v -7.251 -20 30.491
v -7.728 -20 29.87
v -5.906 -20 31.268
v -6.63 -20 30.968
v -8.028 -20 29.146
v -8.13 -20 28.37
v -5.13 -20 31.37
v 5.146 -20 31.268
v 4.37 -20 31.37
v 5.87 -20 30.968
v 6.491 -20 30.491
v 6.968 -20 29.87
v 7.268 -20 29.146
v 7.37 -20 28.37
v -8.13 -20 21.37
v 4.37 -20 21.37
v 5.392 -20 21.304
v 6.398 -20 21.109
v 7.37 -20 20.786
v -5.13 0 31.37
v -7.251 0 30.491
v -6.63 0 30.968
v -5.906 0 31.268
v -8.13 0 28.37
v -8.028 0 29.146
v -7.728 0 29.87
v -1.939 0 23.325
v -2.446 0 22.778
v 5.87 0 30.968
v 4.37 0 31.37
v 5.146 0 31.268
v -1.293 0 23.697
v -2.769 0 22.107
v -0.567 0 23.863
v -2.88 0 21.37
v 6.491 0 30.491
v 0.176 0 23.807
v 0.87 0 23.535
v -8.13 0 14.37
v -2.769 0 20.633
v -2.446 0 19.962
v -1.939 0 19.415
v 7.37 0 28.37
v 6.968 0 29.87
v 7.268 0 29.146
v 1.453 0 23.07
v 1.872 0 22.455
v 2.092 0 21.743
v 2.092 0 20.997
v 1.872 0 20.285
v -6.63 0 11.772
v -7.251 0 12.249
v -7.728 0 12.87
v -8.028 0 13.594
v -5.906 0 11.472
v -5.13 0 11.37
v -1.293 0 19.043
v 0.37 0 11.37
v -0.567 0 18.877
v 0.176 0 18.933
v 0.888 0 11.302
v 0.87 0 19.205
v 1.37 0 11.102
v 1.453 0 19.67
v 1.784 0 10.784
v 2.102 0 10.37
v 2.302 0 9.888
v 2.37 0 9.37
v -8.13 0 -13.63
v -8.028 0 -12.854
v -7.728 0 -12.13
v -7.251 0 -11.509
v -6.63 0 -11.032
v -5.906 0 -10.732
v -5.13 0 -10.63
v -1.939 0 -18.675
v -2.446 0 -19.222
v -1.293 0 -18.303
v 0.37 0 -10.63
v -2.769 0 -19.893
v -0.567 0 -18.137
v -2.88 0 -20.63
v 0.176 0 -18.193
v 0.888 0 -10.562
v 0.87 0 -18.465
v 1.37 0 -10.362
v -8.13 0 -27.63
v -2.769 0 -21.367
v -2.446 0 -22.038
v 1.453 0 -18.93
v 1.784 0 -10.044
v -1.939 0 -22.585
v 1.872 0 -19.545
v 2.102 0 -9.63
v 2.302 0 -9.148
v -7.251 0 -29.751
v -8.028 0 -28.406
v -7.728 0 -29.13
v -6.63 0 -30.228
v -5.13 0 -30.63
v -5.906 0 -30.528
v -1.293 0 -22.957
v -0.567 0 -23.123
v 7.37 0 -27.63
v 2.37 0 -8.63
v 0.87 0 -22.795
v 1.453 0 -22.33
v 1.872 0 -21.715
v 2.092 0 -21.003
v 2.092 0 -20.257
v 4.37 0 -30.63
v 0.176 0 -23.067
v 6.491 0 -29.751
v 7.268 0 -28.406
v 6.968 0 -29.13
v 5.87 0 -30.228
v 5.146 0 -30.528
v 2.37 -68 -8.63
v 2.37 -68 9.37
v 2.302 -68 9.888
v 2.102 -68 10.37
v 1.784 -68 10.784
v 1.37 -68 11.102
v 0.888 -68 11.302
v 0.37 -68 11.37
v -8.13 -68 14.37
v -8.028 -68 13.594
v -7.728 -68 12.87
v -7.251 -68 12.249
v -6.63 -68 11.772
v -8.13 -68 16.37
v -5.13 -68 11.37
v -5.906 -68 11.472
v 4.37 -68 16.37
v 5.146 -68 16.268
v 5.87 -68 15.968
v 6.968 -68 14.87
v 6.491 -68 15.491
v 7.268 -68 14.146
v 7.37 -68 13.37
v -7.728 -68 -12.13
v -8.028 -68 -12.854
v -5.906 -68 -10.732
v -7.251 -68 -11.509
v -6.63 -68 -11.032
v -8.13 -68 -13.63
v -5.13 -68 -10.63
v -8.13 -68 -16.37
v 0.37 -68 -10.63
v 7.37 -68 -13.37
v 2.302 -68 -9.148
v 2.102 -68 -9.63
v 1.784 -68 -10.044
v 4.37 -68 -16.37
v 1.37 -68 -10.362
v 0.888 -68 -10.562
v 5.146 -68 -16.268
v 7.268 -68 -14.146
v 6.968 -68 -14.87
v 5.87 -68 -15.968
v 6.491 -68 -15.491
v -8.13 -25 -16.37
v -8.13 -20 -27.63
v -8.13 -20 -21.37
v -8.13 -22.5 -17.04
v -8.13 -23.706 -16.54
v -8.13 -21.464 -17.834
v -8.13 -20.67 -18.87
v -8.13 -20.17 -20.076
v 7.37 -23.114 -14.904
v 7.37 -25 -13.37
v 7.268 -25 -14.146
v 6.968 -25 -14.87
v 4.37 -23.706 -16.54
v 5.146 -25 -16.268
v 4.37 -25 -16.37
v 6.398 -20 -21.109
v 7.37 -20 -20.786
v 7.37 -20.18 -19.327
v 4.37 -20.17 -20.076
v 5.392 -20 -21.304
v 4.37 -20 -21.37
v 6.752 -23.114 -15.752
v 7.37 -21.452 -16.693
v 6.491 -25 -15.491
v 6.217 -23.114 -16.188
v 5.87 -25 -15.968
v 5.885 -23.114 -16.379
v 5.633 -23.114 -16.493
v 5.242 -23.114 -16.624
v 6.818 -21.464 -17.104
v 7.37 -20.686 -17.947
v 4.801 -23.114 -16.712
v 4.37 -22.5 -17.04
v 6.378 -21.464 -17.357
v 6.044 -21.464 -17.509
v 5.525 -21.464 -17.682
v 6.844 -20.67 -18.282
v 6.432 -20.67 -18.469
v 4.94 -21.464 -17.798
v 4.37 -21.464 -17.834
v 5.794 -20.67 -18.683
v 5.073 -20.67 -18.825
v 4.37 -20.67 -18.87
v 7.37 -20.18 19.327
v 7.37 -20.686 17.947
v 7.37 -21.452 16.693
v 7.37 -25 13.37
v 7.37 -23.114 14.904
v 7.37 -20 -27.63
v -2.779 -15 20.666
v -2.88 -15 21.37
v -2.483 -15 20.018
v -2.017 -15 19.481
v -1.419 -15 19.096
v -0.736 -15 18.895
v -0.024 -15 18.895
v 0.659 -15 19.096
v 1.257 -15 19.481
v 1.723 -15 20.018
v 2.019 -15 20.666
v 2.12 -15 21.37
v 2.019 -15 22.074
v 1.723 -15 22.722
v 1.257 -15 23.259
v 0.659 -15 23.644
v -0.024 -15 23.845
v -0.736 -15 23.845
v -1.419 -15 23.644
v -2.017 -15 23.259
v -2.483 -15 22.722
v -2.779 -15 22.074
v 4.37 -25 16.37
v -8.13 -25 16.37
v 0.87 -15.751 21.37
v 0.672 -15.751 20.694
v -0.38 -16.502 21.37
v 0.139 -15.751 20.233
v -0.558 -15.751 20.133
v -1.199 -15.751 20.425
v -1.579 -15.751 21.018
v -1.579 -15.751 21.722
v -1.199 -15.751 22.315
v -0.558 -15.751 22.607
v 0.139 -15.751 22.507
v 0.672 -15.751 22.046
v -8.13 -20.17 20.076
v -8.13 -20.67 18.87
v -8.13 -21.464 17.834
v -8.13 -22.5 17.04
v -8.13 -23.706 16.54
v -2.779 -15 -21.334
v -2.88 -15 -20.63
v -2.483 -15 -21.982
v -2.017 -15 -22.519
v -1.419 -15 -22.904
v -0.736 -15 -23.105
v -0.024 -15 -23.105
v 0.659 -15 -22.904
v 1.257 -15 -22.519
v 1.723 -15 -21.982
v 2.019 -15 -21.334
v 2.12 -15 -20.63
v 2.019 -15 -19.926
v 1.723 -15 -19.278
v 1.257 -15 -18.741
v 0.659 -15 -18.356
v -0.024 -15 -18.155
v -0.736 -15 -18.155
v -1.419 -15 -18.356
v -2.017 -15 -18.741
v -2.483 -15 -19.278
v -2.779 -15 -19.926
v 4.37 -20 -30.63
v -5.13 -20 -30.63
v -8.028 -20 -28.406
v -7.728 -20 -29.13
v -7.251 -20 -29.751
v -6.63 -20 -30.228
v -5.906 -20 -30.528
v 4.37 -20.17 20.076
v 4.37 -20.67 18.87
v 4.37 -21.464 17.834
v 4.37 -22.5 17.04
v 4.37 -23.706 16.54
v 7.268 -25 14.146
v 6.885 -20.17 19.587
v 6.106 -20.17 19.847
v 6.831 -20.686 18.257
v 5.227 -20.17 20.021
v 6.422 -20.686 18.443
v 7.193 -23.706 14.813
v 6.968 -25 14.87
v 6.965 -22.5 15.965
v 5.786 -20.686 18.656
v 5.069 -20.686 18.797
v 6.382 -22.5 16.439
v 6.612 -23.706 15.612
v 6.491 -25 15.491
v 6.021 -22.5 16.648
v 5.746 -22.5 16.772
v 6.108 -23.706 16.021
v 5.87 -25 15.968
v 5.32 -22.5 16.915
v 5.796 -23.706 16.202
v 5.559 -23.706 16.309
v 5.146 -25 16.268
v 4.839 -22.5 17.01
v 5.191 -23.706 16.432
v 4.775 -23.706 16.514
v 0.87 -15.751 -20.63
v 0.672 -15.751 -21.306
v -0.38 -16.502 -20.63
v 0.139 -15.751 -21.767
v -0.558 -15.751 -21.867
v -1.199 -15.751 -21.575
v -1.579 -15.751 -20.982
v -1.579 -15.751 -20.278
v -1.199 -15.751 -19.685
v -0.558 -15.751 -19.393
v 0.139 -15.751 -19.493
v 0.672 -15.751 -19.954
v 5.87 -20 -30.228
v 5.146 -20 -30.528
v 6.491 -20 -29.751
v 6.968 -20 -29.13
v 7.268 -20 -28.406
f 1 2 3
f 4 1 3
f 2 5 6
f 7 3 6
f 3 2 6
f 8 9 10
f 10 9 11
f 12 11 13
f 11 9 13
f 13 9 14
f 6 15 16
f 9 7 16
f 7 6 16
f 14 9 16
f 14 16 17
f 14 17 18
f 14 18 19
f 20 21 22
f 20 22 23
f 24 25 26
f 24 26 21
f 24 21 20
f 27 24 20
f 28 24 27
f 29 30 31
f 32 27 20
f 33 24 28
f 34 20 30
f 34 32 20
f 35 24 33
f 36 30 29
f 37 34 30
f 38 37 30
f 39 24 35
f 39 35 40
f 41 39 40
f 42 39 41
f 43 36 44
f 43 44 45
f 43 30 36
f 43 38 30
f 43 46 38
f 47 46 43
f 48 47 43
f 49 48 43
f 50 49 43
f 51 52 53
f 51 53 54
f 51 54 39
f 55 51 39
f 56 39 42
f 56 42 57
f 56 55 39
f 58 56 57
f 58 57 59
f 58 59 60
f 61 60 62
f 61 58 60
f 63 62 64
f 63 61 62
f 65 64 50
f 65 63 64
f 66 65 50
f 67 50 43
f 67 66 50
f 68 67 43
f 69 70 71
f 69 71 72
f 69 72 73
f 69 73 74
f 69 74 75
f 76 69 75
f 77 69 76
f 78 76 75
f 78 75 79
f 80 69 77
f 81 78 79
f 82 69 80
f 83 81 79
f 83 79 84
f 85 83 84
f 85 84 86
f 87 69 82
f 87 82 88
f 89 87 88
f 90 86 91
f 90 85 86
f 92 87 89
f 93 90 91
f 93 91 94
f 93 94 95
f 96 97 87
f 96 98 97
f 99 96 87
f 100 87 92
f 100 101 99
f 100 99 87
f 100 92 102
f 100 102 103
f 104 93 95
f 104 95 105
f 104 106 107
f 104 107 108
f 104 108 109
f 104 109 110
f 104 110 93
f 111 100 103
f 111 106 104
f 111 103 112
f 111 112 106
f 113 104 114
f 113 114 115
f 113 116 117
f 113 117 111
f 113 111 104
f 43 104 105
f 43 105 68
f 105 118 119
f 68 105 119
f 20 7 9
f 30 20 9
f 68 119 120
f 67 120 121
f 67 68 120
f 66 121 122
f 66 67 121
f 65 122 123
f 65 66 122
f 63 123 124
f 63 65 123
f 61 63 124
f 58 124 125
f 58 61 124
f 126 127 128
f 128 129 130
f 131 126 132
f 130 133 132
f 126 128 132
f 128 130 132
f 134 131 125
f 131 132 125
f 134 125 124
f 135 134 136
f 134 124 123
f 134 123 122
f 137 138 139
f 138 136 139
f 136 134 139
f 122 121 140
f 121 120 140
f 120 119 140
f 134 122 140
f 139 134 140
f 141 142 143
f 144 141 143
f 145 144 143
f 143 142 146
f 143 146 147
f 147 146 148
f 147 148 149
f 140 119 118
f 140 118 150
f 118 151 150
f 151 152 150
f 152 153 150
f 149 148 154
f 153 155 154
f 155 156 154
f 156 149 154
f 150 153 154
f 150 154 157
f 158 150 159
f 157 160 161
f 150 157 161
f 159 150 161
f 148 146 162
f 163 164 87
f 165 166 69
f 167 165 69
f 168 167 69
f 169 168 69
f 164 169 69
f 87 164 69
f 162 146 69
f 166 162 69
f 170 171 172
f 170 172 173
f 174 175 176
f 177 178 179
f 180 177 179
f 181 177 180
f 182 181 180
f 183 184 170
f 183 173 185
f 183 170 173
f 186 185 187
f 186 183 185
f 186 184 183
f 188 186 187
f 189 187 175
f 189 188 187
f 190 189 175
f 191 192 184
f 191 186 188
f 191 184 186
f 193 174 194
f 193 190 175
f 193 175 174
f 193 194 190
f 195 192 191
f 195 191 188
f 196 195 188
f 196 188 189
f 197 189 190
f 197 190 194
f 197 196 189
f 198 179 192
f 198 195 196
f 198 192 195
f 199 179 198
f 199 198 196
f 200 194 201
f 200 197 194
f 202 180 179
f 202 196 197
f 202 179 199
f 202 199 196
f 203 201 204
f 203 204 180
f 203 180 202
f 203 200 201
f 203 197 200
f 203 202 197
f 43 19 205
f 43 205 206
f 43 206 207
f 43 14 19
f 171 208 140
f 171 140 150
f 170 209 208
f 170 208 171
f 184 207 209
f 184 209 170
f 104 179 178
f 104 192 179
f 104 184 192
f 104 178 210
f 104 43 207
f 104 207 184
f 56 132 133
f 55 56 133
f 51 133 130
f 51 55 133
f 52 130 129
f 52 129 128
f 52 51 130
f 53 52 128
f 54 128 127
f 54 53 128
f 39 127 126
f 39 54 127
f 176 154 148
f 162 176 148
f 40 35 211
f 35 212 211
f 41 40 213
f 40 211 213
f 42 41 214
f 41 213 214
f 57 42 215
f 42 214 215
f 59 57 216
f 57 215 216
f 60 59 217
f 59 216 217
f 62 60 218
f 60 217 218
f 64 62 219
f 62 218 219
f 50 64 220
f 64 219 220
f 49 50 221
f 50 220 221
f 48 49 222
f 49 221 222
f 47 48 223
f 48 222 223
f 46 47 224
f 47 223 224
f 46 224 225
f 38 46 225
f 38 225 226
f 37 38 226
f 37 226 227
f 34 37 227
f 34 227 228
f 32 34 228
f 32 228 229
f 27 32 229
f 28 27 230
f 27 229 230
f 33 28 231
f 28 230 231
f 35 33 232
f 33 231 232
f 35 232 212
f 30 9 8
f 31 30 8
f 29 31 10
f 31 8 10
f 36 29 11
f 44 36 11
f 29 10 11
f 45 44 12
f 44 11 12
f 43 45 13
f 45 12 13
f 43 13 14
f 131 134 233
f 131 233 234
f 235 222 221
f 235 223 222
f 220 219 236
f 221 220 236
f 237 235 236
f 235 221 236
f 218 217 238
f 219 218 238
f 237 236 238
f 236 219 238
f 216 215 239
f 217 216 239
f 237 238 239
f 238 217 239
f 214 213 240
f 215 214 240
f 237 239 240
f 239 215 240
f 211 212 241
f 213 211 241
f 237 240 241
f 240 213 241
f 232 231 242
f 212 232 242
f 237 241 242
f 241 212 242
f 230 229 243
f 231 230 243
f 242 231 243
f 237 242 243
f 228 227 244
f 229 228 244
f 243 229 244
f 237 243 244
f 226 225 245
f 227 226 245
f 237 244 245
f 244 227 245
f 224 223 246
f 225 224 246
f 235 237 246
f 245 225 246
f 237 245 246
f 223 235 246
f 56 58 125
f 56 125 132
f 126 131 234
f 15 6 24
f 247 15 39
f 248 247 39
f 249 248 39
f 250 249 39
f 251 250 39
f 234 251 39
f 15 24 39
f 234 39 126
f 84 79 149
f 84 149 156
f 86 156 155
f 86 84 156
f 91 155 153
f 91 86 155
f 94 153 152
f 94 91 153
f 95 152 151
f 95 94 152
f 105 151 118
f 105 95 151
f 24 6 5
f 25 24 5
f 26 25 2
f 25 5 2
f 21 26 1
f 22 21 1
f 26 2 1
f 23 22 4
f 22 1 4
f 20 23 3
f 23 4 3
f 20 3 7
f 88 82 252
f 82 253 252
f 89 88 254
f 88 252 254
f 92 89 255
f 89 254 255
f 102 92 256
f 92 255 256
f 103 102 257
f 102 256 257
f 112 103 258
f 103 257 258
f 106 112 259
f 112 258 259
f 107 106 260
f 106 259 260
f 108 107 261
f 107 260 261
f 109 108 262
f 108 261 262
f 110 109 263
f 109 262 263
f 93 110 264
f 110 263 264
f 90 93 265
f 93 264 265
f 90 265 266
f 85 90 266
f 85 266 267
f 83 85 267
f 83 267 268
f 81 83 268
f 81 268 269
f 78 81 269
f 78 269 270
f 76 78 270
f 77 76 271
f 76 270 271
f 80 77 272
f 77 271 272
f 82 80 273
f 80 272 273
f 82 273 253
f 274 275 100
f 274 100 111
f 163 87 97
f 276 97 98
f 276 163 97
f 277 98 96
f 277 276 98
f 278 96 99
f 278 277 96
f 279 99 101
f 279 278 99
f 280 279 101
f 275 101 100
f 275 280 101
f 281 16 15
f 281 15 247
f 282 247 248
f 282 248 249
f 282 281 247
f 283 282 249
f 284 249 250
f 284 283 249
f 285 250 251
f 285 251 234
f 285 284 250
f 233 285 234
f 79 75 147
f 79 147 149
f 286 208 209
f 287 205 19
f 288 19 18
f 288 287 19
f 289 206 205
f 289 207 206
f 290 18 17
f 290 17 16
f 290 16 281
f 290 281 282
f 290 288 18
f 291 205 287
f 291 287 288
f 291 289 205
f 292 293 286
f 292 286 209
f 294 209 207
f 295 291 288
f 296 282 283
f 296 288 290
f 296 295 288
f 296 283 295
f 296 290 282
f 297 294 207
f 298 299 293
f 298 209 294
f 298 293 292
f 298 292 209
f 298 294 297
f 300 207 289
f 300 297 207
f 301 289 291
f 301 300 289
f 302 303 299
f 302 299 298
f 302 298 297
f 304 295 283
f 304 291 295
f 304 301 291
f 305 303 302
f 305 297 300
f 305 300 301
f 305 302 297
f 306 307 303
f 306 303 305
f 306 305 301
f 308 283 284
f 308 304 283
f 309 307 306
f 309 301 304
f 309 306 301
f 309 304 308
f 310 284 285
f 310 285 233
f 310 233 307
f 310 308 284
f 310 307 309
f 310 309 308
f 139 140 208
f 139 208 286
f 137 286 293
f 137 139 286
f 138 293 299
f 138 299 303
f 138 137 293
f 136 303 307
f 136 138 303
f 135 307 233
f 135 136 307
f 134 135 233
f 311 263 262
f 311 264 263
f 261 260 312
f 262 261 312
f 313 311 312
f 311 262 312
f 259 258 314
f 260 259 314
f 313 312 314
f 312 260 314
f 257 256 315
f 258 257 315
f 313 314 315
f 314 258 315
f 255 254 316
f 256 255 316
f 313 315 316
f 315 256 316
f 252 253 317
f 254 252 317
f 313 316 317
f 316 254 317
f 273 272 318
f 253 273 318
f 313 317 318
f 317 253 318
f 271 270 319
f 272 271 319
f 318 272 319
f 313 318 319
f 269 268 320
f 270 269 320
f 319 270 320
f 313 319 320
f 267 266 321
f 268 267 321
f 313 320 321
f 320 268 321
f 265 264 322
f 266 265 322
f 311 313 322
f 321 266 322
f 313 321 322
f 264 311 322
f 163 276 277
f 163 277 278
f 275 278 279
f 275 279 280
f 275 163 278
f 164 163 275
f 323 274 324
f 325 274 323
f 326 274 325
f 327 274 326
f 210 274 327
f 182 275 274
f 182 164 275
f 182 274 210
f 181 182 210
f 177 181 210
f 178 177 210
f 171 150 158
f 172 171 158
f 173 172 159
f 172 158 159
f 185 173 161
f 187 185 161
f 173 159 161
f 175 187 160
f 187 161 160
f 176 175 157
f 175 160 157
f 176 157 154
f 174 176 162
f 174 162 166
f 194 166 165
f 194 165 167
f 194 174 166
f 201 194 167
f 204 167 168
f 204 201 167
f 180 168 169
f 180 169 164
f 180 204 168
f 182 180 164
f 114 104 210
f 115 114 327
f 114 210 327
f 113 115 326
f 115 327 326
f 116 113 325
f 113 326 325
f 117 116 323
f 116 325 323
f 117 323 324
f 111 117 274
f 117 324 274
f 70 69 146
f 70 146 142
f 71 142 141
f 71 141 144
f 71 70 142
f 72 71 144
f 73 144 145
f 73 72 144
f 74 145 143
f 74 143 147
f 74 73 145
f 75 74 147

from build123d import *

# Parameters (mm, degrees)
SKETCH1_W             = 15.5
SKETCH1_H             = 62
BOSS_EXTRUDE1_DEPTH   = 68
FILLET1_R             = 3
CUT_EXTRUDE1_REACH    = 77.327
CUT_EXTRUDE2_DEPTH    = 48
FILLET2_R             = 5
M6_TAPPED_HOLE1_D     = 5
M6_TAPPED_HOLE1_DEPTH = 15
M6_TAPPED_HOLE1_TIP   = 1.502151548


with BuildPart() as part:
    # Sketch1 → Boss-Extrude1 (new body)
    with BuildSketch(Plane(origin=(0, 0, 0), x_dir=(1, 0, 0), z_dir=(0, 1, 0))):
        with Locations((-0.38, -0.37)):
            Rectangle(SKETCH1_W, SKETCH1_H)
    extrude(amount=-BOSS_EXTRUDE1_DEPTH)

    # Fillet1
    fillet1_edges = [part.edges().sort_by_distance(p)[0] for p in [
        (7.37, -34, 31.37),
        (-8.13, -34, 31.37),
        (-8.13, -34, -30.63),
        (7.37, -34, -30.63),
    ]]
    fillet(fillet1_edges, radius=FILLET1_R)

    # Sketch2 → Cut-Extrude1 (cut, up to next)
    with BuildSketch(Plane(origin=(0, 0, 0), x_dir=(1, 0, 0), z_dir=(0, 1, 0)), mode=Mode.PRIVATE) as cut_extrude1_sk1:
        with BuildLine():
            Line((-5.13, 10.63), (0.37, 10.63))
            ThreePointArc((0.37, 10.63), (1.784213562, 10.044213562), (2.37, 8.63))
            Line((2.37, 8.63), (2.37, -9.37))
            ThreePointArc((2.37, -9.37), (1.784213562, -10.784213562), (0.37, -11.37))
            Line((0.37, -11.37), (-5.13, -11.37))
            ThreePointArc((-5.13, -11.37), (-7.251320344, -12.248679656), (-8.13, -14.37))
            Line((-8.13, -14.37), (-8.13, 13.63))
            ThreePointArc((-8.13, 13.63), (-7.251320344, 11.508679656), (-5.13, 10.63))
        make_face()
    cut_extrude1_tool1 = extrude(cut_extrude1_sk1.sketch, amount=-CUT_EXTRUDE1_REACH, mode=Mode.PRIVATE) & part.part
    add(cut_extrude1_tool1.solids().sort_by_distance((-2.991251, 0, 0.37))[0], mode=Mode.SUBTRACT)

    # Sketch3 → Cut-Extrude2 (cut)
    with BuildSketch(Plane(origin=(0, -68, 0), x_dir=(1, 0, 0), z_dir=(0, 1, 0))):
        with BuildLine():
            Line((4.37, -16.37), (-8.13, -16.37))
            Line((-8.13, -16.37), (-8.13, -28.37))
            ThreePointArc((-8.13, -28.37), (-7.251320344, -30.491320344), (-5.13, -31.37))
            Line((-5.13, -31.37), (4.37, -31.37))
            ThreePointArc((4.37, -31.37), (6.491320344, -30.491320344), (7.37, -28.37))
            Line((7.37, -28.37), (7.37, -13.37))
            ThreePointArc((7.37, -13.37), (6.491320344, -15.491320344), (4.37, -16.37))
        make_face()
    cut_extrude2 = extrude(amount=CUT_EXTRUDE2_DEPTH, mode=Mode.SUBTRACT)

    # Mirror1: Cut-Extrude2 across plane
    add(cut_extrude2.mirror(Plane.XY), mode=Mode.SUBTRACT)

    # Fillet2
    # the kernel refuses this fillet: 5 mm, written as the material it adds along each edge
    with BuildSketch(Plane(origin=(4.37, -20, -16.37), x_dir=(0, -1, 0), z_dir=(-1, 0, 0)), Plane(origin=(4.37, -20, 16.37), x_dir=(0, 0, 1), z_dir=(-1, 0, 0))) as fillet2_piece_1:
        with BuildLine():
            CenterArc((FILLET2_R, -FILLET2_R), FILLET2_R, 90, 90)
            Line((0, -FILLET2_R), (0, 0))
            Line((0, 0), (FILLET2_R, 0))
        make_face()
    extrude(amount=12.5)
    with BuildSketch(Plane(origin=(4.37, -20, -13.37), x_dir=(-0.5176042277799098, 0, -0.855620163030514), z_dir=(0.855620163030514, 0, -0.5176042277799098))) as fillet2_piece_2_section:
        with BuildLine():
            CenterArc((-3 - FILLET2_R, -FILLET2_R), FILLET2_R, 0, 90)
            Line((-3, -FILLET2_R), (-3, 0))
            Line((-3, 0), (-3 - FILLET2_R, 0))
        make_face()
    fillet2_piece_2 = revolve(axis=Axis((4.37, -20, -13.37), (0, 1, 0)), revolution_arc=328.828315396, mode=Mode.PRIVATE)
    fillet2_piece_2 = split(fillet2_piece_2, bisect_by=Plane(origin=(6.644254363, -21.721658314, -10.63), z_dir=(0, 0, -1)), keep=Keep.TOP, mode=Mode.PRIVATE)
    fillet2_piece_2 = split(fillet2_piece_2, bisect_by=Plane(origin=(7.37, -21.721658314, -15.644254458), z_dir=(-1, 0, 0)), keep=Keep.TOP, mode=Mode.PRIVATE)
    add(fillet2_piece_2)
    with BuildSketch(Plane(origin=(4.37, -20, 13.37), x_dir=(-0.5176042277799098, 0, 0.855620163030514), z_dir=(0.855620163030514, 0, 0.5176042277799098))) as fillet2_piece_3_section:
        with BuildLine():
            CenterArc((-3 - FILLET2_R, FILLET2_R), FILLET2_R, 270, 90)
            Line((-3, FILLET2_R), (-3, 0))
            Line((-3, 0), (-3 - FILLET2_R, 0))
        make_face()
    fillet2_piece_3 = revolve(axis=Axis((4.37, -20, 13.37), (0, -1, 0)), revolution_arc=328.828315396, mode=Mode.PRIVATE)
    fillet2_piece_3 = split(fillet2_piece_3, bisect_by=Plane(origin=(6.644254403, -21.721658525, 11.37), z_dir=(0, 0, 1)), keep=Keep.TOP, mode=Mode.PRIVATE)
    fillet2_piece_3 = split(fillet2_piece_3, bisect_by=Plane(origin=(7.37, -21.721658525, 15.644254403), z_dir=(-1, 0, 0)), keep=Keep.TOP, mode=Mode.PRIVATE)
    add(fillet2_piece_3)

    # M6 Tapped Hole1
    with Locations(Plane(origin=(0, 0, 0), x_dir=(1, 0, 0), z_dir=(0, 1, 0))):
        with Locations((-0.38, 20.63), (-0.38, -21.37)):
            Hole(M6_TAPPED_HOLE1_D / 2, depth=M6_TAPPED_HOLE1_DEPTH)
            with Locations((0, 0, -(M6_TAPPED_HOLE1_DEPTH + M6_TAPPED_HOLE1_TIP / 2))):  # 118° drill point
                Cone(0, M6_TAPPED_HOLE1_D / 2, M6_TAPPED_HOLE1_TIP, mode=Mode.SUBTRACT)


solid = part.part
